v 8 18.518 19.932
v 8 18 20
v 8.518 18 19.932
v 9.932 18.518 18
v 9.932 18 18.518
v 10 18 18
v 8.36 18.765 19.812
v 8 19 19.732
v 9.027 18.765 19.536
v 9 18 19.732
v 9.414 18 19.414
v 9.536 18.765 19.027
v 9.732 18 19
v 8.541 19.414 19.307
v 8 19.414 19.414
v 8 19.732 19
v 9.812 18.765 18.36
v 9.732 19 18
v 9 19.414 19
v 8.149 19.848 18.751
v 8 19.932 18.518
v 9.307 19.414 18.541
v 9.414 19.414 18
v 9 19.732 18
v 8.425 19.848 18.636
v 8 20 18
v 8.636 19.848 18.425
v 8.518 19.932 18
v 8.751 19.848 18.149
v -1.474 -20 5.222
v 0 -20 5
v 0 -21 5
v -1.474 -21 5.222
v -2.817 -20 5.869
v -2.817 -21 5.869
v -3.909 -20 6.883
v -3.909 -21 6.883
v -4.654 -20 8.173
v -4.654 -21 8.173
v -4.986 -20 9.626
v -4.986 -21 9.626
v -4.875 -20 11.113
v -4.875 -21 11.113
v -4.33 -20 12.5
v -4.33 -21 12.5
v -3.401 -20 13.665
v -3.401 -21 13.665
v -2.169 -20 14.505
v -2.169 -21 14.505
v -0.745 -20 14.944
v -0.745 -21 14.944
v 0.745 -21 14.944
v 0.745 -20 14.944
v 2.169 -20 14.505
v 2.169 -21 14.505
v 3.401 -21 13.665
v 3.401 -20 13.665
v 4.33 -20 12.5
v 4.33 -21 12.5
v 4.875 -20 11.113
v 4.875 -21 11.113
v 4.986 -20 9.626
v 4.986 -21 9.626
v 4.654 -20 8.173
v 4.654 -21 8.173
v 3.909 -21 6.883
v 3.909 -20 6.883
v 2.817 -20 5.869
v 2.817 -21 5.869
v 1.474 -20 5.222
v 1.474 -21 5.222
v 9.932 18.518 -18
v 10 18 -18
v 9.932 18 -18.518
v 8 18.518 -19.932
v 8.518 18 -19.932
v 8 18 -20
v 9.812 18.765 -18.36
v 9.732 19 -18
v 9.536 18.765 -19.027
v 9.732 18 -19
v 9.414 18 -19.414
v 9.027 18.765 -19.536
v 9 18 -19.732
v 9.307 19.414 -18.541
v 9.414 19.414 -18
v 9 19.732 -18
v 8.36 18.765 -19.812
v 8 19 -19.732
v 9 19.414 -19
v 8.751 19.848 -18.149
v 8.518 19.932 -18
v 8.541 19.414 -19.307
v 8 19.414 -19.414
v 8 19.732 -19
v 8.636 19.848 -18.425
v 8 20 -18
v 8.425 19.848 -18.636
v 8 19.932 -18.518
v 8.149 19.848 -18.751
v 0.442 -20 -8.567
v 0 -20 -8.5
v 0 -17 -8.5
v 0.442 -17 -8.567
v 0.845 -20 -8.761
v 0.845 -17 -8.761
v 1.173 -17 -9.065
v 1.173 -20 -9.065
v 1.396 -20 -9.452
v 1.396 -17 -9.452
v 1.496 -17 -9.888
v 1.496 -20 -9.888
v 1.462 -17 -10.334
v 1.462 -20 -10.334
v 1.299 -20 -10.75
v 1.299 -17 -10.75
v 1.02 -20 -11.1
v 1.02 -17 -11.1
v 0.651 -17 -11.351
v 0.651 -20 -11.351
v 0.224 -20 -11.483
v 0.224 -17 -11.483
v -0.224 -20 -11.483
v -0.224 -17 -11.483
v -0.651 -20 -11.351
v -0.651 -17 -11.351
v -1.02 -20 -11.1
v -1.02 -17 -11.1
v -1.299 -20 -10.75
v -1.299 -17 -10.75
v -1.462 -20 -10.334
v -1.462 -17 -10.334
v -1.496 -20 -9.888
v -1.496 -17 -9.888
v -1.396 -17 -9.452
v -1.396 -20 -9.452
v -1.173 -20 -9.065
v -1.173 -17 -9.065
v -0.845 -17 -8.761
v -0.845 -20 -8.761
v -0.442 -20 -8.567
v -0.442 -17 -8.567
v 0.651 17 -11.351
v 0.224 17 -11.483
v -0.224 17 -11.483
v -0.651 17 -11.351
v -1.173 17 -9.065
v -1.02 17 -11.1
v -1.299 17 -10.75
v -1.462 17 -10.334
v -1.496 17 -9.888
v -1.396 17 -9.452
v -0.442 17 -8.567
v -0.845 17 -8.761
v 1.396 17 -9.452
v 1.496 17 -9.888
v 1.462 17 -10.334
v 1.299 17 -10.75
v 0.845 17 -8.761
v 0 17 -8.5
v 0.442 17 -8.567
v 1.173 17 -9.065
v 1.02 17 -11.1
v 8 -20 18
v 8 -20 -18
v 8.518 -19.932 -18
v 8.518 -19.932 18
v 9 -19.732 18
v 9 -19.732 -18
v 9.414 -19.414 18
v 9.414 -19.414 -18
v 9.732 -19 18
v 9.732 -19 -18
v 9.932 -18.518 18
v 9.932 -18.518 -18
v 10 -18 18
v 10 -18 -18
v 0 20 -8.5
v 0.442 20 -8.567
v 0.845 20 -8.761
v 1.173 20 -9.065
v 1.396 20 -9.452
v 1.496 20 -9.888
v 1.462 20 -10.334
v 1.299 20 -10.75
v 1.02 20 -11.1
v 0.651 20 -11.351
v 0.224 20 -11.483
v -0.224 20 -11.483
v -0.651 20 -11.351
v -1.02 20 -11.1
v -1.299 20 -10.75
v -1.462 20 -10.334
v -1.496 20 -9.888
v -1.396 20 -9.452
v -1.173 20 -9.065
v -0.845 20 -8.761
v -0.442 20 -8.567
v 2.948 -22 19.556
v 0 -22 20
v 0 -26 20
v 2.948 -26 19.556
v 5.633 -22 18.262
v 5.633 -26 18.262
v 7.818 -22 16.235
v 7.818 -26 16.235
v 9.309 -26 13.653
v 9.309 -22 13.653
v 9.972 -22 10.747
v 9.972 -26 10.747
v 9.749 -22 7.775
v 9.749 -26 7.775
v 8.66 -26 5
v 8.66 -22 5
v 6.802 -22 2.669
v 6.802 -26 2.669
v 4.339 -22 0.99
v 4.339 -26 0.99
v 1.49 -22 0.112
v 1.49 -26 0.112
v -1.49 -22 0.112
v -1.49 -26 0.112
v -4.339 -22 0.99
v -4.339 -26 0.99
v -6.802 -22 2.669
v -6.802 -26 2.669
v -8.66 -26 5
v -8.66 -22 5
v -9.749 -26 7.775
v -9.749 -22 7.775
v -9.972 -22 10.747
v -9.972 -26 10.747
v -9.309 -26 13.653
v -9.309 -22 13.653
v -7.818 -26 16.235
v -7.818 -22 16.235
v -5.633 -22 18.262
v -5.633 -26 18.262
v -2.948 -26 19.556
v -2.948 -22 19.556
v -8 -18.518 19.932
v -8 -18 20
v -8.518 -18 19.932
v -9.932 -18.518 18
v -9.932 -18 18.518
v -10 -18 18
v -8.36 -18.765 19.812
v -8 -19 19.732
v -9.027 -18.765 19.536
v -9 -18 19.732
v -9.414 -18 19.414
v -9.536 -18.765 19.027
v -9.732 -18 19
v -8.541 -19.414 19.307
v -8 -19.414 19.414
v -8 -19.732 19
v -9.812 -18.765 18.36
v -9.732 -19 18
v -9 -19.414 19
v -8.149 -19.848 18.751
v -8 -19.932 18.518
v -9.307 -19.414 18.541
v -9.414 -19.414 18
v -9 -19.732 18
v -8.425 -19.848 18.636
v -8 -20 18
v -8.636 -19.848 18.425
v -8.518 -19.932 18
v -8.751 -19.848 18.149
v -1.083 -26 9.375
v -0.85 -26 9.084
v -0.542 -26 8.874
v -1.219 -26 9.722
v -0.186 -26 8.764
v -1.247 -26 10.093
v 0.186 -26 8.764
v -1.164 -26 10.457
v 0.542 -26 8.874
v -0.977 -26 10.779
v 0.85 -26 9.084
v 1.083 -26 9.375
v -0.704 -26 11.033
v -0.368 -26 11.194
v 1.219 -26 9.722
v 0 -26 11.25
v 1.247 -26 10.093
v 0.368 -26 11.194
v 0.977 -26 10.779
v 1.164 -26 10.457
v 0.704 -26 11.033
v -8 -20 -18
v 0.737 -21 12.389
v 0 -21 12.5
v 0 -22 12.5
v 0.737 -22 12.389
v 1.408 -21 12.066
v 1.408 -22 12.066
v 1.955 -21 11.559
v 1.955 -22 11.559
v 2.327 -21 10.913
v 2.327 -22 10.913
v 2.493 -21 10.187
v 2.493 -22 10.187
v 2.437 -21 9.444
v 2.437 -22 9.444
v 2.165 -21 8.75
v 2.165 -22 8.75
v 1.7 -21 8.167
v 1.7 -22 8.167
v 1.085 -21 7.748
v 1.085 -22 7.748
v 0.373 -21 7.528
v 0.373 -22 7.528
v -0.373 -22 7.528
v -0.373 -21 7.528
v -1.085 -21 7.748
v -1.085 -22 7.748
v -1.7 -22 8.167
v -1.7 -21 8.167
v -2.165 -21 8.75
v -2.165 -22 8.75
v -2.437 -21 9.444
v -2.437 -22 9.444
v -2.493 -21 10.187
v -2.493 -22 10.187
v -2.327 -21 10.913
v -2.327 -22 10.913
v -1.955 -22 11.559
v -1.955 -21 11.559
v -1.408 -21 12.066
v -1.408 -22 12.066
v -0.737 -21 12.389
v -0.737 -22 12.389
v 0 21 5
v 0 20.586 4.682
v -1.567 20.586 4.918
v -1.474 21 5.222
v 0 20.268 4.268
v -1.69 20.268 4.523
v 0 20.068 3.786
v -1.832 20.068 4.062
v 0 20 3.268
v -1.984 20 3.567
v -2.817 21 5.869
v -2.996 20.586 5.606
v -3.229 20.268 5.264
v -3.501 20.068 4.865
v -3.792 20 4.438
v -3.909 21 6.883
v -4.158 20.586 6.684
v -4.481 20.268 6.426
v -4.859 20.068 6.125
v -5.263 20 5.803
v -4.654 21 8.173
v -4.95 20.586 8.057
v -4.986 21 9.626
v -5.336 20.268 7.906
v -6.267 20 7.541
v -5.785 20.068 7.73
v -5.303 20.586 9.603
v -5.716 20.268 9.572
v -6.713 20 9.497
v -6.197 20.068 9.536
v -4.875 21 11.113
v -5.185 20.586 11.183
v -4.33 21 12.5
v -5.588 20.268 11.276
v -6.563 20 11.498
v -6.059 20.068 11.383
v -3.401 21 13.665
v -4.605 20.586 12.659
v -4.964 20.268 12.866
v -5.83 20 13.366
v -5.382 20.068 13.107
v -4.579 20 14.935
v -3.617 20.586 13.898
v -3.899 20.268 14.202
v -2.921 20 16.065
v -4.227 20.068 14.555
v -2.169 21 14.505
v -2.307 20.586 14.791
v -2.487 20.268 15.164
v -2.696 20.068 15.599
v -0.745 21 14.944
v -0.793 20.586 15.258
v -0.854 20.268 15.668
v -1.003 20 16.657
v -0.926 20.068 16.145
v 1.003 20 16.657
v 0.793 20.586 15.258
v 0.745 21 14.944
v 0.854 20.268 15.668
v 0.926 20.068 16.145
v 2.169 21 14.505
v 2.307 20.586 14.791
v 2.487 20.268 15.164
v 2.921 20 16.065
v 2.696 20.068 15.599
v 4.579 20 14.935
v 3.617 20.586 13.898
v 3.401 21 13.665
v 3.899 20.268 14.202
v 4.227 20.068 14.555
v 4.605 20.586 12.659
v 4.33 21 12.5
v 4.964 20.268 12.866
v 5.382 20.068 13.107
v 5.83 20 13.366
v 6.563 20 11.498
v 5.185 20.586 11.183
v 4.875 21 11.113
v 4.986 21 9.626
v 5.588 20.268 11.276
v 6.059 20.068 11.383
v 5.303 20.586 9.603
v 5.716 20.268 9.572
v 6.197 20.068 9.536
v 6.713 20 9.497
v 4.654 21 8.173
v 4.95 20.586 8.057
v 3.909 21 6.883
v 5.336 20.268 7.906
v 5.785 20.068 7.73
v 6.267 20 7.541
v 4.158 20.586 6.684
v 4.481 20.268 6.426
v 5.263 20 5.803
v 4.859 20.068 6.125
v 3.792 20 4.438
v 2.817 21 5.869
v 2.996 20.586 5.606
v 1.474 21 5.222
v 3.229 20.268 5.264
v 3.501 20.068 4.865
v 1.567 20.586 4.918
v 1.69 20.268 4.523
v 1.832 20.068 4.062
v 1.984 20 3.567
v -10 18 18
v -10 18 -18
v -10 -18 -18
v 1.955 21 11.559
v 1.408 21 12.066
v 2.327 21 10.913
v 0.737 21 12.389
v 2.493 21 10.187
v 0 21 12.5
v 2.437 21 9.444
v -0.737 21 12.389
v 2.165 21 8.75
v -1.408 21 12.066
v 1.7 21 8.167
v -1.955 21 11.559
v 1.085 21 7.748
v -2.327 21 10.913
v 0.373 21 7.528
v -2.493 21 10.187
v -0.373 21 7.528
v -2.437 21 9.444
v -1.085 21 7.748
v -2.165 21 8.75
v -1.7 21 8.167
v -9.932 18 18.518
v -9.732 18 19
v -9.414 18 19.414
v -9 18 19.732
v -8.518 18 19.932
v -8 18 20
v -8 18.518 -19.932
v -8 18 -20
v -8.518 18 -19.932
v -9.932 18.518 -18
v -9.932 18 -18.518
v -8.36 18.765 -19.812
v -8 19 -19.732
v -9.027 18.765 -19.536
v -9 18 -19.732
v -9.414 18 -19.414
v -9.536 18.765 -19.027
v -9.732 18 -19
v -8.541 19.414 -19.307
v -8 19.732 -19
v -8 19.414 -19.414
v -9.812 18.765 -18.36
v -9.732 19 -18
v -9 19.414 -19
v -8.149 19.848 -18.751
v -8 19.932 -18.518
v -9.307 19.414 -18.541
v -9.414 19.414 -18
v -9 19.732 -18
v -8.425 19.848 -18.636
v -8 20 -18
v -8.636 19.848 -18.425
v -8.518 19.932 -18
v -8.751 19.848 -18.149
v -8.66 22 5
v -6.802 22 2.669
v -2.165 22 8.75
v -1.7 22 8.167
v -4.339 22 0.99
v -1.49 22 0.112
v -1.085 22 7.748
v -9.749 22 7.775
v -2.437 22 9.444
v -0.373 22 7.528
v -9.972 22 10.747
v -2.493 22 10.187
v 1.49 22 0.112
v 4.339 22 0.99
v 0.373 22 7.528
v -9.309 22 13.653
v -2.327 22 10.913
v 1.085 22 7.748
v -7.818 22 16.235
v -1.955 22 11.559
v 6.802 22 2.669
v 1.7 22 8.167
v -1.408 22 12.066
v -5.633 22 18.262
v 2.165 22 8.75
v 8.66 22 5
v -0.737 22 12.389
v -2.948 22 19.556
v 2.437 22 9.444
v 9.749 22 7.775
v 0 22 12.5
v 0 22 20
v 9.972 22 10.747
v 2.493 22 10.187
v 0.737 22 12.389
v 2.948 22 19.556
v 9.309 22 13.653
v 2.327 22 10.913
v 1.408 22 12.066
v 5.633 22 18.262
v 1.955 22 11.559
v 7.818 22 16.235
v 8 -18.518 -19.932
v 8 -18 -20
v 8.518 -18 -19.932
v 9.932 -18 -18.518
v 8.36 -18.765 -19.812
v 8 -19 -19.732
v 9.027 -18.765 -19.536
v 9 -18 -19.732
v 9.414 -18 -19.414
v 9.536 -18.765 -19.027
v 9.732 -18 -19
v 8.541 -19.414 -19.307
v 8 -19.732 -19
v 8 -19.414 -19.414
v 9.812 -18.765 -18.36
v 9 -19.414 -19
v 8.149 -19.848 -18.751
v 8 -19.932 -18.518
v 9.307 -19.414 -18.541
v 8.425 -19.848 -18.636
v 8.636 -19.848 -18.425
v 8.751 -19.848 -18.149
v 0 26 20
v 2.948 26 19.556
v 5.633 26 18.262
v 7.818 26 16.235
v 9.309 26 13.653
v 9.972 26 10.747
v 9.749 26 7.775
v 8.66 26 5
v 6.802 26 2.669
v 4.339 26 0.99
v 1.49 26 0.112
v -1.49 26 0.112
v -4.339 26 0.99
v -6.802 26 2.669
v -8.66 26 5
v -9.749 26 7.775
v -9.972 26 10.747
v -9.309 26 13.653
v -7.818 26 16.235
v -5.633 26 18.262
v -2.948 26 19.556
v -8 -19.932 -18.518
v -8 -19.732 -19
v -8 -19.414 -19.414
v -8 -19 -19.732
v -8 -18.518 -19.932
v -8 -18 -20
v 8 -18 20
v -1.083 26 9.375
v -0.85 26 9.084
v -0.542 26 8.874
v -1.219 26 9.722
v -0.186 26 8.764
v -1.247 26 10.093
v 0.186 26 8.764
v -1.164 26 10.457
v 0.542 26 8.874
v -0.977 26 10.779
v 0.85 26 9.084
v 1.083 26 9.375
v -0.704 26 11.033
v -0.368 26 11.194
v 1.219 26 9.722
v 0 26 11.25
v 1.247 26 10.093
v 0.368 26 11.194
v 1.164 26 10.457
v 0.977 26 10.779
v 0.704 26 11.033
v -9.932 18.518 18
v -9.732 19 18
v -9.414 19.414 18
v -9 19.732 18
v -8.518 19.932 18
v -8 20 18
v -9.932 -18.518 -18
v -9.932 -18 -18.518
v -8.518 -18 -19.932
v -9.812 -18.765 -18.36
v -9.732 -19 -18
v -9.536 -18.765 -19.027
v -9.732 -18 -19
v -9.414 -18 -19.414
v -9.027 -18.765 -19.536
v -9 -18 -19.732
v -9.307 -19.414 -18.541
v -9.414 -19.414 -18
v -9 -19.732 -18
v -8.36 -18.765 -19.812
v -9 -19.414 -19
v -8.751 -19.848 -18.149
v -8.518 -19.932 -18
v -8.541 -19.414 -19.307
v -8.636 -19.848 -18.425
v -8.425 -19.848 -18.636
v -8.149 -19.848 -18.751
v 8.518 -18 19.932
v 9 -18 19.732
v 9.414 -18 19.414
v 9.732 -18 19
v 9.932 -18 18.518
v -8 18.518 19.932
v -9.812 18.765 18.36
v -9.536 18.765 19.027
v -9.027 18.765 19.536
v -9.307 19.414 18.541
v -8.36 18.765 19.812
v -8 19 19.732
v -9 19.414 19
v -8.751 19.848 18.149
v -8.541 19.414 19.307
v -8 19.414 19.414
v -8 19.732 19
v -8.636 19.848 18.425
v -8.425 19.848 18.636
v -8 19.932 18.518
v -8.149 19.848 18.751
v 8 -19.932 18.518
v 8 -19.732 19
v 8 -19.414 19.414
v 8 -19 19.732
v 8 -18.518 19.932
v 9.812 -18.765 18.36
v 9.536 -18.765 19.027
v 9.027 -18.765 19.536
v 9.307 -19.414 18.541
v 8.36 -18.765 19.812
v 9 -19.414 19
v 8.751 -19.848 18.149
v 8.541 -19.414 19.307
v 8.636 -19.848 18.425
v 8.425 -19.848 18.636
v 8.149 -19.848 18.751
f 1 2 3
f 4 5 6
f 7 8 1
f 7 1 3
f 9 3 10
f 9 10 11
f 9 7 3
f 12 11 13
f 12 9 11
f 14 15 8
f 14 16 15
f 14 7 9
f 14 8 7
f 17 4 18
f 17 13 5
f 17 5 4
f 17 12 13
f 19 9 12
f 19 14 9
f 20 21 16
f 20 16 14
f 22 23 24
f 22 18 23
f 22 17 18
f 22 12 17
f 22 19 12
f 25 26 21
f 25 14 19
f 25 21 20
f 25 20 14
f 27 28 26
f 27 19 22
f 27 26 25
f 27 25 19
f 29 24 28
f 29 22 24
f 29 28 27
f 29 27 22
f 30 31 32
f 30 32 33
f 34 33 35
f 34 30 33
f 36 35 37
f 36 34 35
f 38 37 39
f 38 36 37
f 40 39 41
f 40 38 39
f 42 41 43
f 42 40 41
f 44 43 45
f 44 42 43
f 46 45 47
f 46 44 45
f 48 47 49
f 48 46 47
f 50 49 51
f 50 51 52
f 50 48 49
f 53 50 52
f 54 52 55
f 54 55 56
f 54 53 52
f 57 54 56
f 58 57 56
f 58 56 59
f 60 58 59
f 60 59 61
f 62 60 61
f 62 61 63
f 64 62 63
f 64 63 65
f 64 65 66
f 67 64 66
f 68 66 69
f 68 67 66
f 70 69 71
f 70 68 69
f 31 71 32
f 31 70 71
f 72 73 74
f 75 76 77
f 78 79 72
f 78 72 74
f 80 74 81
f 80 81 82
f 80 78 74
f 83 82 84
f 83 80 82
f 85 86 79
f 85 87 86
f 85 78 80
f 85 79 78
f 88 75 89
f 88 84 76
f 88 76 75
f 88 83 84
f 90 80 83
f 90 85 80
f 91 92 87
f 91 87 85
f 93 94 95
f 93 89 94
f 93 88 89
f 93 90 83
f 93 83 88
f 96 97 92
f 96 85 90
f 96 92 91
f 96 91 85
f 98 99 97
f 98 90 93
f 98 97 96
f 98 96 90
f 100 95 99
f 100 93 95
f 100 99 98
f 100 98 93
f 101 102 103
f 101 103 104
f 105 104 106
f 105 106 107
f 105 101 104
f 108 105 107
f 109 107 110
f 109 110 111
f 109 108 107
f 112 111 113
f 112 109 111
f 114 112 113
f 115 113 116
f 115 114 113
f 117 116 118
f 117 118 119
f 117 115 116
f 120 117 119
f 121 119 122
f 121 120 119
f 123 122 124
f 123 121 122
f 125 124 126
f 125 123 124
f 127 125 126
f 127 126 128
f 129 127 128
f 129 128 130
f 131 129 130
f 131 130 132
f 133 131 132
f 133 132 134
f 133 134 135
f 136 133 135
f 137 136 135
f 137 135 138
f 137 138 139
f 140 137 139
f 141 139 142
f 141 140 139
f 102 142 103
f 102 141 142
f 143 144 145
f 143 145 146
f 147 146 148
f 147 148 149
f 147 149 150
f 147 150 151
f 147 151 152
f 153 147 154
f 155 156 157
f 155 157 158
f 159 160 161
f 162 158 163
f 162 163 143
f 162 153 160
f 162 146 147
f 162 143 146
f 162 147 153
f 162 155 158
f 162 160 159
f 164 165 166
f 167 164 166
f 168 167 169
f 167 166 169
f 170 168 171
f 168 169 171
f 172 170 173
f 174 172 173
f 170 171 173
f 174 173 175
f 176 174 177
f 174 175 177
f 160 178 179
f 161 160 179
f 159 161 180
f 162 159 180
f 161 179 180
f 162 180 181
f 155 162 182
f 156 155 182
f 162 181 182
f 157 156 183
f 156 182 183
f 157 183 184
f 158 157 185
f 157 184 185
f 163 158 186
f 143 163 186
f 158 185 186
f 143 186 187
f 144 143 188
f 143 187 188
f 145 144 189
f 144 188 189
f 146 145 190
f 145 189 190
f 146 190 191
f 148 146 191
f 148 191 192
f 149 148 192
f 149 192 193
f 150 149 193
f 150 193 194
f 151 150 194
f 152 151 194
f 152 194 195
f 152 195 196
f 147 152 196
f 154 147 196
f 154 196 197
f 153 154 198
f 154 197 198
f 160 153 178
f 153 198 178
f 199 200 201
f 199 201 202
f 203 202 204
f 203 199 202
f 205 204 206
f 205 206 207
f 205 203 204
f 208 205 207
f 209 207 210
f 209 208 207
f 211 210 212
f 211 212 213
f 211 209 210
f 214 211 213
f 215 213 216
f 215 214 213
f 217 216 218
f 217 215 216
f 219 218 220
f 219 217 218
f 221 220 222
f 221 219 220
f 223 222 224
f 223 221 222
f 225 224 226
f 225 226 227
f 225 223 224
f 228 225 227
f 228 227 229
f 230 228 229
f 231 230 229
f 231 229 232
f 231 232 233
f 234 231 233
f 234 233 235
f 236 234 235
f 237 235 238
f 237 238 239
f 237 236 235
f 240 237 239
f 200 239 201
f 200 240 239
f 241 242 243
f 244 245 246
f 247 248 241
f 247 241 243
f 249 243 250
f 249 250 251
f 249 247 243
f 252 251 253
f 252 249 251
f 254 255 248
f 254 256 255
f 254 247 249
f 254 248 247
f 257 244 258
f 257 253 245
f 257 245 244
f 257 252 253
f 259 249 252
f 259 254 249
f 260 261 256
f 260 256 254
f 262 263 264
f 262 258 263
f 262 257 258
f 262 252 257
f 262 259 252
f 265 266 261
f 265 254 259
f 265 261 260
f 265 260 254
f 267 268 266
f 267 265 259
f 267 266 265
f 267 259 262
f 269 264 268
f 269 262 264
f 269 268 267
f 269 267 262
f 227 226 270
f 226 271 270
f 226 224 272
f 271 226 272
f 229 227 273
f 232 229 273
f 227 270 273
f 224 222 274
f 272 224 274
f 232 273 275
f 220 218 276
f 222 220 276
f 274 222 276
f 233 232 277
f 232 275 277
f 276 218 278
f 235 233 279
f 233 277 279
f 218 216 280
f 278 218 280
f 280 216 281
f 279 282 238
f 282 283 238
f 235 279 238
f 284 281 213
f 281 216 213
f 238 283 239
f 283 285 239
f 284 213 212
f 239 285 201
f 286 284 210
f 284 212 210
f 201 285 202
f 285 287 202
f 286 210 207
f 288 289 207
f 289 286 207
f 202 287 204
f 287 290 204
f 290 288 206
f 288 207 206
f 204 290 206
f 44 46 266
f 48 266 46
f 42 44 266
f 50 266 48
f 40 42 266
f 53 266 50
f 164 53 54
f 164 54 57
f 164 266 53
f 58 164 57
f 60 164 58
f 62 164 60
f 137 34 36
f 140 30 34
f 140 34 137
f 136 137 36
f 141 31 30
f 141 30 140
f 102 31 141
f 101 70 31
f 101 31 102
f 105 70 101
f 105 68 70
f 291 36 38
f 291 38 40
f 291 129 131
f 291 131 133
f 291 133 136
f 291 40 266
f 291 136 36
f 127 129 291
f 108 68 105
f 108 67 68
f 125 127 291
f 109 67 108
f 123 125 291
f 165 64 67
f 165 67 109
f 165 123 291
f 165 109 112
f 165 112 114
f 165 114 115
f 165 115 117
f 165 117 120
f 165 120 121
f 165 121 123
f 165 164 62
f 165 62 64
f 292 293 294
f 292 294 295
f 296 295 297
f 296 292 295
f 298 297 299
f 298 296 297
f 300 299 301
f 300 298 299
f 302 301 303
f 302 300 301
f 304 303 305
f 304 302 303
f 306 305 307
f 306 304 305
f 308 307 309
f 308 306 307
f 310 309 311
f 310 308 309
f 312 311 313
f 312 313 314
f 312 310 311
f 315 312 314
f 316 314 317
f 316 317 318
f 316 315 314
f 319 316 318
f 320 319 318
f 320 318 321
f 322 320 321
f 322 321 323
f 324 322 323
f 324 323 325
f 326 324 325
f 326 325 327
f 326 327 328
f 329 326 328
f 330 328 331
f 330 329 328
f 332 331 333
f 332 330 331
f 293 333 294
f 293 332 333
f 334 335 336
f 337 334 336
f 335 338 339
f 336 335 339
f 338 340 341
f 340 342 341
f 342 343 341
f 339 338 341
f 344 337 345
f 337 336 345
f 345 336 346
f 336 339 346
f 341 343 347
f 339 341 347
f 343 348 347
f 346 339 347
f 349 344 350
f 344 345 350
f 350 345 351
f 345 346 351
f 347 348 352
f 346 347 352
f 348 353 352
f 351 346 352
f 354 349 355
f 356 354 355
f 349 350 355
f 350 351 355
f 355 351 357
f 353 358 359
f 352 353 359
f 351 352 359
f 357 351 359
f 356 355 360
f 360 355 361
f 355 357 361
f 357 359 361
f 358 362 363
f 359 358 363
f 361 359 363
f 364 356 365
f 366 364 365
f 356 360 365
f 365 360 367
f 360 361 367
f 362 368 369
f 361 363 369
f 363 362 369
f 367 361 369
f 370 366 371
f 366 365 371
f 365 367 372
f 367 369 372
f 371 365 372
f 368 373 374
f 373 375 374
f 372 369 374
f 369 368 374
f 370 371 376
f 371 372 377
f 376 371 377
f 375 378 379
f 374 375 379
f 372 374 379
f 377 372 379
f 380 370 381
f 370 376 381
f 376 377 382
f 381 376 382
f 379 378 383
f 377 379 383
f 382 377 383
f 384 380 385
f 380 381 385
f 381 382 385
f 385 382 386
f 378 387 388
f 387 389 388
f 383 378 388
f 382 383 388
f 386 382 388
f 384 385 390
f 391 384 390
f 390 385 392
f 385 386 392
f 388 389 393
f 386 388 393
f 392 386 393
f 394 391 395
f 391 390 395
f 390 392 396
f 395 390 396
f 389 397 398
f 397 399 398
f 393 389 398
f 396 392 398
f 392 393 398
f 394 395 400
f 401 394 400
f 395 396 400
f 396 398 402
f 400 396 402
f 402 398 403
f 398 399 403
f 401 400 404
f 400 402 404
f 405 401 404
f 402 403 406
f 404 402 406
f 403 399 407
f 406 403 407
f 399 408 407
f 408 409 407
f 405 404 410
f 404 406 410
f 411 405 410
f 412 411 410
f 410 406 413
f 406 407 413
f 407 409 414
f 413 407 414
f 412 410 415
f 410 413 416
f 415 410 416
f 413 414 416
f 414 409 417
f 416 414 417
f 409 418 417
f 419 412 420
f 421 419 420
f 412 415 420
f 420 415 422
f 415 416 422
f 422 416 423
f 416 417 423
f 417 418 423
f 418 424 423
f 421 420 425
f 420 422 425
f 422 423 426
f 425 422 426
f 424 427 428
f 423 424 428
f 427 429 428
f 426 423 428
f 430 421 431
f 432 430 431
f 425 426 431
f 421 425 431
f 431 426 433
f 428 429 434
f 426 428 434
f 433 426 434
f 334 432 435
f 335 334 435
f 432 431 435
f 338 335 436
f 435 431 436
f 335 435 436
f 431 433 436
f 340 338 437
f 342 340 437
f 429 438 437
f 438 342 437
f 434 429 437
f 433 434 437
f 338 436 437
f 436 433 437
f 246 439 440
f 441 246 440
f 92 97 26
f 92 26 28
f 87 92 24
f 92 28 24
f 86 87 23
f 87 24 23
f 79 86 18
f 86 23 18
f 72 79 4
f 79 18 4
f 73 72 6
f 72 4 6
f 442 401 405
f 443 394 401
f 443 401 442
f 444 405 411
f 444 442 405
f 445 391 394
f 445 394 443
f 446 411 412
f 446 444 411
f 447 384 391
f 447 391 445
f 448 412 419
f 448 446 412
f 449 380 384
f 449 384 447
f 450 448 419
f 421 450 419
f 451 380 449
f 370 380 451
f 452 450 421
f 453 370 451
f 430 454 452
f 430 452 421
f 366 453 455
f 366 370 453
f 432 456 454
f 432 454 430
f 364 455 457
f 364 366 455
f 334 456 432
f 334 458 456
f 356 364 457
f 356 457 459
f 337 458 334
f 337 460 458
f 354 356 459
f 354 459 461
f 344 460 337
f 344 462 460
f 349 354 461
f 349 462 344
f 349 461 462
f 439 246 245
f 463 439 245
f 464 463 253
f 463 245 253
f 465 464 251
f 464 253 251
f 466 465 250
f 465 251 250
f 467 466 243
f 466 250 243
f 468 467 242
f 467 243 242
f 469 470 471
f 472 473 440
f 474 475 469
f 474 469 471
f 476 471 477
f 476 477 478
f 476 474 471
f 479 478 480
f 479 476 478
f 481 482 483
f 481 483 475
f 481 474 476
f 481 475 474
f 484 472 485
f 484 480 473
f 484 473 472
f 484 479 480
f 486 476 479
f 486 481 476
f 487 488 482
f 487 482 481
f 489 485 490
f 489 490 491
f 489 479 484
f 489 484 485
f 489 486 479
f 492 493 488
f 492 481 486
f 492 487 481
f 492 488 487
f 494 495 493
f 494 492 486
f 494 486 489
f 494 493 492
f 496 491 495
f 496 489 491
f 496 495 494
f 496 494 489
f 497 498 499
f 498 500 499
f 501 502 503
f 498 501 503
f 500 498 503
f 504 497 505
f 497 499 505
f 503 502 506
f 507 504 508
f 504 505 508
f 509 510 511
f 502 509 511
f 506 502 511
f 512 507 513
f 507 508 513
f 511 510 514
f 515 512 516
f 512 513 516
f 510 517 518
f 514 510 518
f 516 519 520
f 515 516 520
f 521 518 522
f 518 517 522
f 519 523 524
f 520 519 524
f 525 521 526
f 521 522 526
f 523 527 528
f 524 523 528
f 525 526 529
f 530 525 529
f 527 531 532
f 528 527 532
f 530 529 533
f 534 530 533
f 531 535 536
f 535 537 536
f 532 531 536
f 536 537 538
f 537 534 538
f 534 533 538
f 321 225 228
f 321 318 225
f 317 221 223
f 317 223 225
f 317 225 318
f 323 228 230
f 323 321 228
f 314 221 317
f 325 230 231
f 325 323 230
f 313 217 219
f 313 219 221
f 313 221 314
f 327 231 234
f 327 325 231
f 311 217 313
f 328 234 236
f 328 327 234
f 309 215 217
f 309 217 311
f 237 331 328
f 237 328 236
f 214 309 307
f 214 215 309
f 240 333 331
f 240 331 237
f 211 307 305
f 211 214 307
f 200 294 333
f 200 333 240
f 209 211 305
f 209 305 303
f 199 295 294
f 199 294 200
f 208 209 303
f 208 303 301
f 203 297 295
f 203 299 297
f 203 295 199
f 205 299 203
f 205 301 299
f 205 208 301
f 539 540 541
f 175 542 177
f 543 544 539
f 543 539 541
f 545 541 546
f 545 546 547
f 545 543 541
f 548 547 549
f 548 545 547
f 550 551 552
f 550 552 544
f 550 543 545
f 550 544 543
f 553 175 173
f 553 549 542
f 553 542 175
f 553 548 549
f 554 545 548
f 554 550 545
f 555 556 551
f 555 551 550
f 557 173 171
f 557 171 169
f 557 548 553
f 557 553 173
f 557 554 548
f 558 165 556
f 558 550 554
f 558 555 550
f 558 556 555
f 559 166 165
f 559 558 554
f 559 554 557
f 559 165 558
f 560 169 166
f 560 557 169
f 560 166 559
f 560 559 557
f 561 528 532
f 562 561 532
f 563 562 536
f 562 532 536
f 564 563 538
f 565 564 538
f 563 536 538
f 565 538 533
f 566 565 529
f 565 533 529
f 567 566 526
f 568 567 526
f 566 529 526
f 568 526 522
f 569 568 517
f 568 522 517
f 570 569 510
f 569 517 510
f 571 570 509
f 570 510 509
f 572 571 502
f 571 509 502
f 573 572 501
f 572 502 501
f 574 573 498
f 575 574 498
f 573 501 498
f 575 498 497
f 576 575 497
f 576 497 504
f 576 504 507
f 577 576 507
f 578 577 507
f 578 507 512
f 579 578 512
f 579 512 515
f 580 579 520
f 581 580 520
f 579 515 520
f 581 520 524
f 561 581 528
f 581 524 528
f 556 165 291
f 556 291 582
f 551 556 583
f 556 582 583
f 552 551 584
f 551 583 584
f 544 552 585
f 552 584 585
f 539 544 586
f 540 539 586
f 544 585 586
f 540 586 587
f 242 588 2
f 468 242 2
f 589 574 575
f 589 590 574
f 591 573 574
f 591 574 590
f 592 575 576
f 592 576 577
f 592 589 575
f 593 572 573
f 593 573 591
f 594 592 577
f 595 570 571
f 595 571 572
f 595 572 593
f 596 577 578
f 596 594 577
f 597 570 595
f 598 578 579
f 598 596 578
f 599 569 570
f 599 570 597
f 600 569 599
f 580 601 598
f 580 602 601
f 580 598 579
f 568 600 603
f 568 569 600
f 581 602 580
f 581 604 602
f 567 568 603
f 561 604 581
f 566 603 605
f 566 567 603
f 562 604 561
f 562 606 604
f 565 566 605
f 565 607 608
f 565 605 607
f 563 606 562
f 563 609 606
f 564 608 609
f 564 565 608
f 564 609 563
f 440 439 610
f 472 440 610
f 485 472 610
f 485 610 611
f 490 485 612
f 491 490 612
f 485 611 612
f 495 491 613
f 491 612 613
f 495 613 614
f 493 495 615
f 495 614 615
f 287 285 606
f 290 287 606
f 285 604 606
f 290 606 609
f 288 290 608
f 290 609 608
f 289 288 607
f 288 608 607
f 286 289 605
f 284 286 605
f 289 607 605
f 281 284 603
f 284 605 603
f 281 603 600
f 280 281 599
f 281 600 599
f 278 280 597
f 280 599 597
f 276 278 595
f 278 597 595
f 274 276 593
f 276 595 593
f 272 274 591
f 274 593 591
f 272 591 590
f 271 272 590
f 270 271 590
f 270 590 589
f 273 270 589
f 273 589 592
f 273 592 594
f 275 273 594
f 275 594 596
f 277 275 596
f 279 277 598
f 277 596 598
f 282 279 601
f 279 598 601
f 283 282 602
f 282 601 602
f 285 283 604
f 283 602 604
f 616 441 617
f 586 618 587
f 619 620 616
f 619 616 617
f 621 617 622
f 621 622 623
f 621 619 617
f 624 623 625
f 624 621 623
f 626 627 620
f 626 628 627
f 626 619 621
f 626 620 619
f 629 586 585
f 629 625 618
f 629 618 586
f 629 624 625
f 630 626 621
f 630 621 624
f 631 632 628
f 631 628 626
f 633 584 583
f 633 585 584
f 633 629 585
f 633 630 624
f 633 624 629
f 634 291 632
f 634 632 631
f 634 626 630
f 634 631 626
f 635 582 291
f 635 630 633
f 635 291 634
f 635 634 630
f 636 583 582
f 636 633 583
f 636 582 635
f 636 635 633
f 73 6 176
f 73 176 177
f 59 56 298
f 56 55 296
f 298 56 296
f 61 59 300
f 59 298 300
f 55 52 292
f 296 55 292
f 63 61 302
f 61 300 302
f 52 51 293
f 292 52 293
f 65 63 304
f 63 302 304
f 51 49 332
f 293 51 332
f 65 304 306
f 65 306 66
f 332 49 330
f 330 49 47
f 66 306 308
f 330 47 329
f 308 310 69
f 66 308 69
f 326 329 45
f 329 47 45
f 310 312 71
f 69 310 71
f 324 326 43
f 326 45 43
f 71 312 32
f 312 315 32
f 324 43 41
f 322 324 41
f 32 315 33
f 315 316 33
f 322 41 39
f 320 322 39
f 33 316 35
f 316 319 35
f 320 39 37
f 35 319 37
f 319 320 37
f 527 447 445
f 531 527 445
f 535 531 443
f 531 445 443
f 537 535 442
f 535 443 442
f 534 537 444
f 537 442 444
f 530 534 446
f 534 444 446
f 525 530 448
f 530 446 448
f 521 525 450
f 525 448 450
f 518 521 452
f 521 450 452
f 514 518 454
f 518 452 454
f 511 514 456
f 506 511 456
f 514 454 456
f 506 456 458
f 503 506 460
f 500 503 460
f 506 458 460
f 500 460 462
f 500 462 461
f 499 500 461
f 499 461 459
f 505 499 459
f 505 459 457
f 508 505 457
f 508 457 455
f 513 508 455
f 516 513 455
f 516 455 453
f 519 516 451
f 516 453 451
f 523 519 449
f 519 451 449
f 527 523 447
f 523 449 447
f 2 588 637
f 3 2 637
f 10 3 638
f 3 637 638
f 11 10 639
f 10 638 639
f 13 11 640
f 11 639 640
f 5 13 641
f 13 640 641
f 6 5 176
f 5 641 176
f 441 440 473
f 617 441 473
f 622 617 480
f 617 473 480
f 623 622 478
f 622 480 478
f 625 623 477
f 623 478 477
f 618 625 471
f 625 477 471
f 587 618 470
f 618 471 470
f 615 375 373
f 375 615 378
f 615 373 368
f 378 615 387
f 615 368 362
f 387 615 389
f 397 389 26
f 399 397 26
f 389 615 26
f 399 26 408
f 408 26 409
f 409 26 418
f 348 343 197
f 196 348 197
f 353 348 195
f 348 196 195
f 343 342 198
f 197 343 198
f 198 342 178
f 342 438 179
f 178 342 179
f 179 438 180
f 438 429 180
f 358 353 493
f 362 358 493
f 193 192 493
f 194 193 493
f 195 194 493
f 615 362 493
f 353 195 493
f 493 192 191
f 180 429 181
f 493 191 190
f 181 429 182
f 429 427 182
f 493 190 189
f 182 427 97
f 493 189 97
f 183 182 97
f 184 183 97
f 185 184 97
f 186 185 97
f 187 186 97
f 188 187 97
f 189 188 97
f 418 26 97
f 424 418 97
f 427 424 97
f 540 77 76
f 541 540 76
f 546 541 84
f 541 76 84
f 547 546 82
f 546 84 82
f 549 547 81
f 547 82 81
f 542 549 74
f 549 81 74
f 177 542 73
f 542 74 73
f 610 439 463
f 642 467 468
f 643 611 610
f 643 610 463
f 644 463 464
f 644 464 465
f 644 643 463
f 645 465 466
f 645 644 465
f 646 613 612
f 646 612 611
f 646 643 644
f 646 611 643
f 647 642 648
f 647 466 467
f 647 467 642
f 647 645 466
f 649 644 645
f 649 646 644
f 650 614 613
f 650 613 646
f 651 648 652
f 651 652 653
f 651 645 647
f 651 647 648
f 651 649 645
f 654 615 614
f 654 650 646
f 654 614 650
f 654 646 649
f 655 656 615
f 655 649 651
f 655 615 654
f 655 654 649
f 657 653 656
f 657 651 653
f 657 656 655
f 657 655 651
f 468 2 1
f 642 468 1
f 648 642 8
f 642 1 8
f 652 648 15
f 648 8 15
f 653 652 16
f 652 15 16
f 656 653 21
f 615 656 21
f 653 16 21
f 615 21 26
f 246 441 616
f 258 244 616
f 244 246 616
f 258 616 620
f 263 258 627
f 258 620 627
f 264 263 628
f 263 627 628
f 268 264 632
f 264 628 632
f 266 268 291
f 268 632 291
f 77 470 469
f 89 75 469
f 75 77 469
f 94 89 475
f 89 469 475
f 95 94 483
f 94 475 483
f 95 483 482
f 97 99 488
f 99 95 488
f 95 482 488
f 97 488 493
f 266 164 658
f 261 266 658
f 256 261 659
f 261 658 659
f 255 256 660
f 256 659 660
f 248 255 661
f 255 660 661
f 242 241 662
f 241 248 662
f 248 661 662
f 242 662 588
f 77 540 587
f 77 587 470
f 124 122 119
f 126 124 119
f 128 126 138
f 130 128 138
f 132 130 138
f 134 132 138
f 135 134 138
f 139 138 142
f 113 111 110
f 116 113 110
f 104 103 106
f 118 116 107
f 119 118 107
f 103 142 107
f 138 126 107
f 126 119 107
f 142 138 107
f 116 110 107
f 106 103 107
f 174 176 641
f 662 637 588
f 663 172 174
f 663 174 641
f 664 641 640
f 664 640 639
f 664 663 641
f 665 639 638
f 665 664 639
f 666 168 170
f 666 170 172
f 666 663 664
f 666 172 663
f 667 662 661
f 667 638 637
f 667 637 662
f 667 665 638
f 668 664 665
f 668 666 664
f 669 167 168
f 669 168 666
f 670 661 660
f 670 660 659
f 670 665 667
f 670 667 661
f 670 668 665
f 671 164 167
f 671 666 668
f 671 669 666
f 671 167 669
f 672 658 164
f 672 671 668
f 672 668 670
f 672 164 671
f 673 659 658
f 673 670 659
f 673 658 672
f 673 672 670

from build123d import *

# Parameters (mm, degrees)
SKETCH_1_W          = 40
SKETCH_1_H          = 40
EXTRUDE_1_DEPTH     = 10
SKETCH_2_R          = 5
EXTRUDE_2_DEPTH     = 1
SKETCH_3_R          = 2.5
EXTRUDE_3_DEPTH     = 1
SKETCH_4_R          = 10
EXTRUDE_4_DEPTH     = 4
CUT_EXTRUDE_START   = -46
SKETCH_5_R          = 1.25
CUT_EXTRUDE_1_DEPTH = 46
FILLET_1_R          = 2
SKETCH_6_R          = 1.5
CUT_EXTRUDE_2_DEPTH = 3


with BuildPart() as part:
    # 草图1 → 凸台-拉伸1 (new, symmetric)
    with BuildSketch(Plane(origin=(0, 0, 0), x_dir=(0, 0, -1), z_dir=(1, 0, 0))):
        Rectangle(SKETCH_1_W, SKETCH_1_H)
    extrude(amount=EXTRUDE_1_DEPTH, both=True)

    # 草图2 → 凸台-拉伸2 (add)
    with BuildSketch(Plane(origin=(0, 20, 0), x_dir=(1, 0, 0), z_dir=(0, 1, 0))):
        with Locations(Location((0, -10, 0), (0, 0, 90))):
            Circle(SKETCH_2_R)
    extrude_2 = extrude(amount=EXTRUDE_2_DEPTH)

    # 草图3 → 凸台-拉伸3 (add)
    with BuildSketch(Plane(origin=(0, 21, 0), x_dir=(1, 0, 0), z_dir=(0, 1, 0))):
        with Locations(Location((0, -10, 0), (0, 0, 270))):
            Circle(SKETCH_3_R)
    extrude_3 = extrude(amount=EXTRUDE_3_DEPTH)

    # 草图4 → 凸台-拉伸4 (add)
    with BuildSketch(Plane(origin=(0, 22, 0), x_dir=(1, 0, 0), z_dir=(0, 1, 0))):
        with Locations(Location((0, -10, 0), (0, 0, 270))):
            Circle(SKETCH_4_R)
    extrude_4 = extrude(amount=EXTRUDE_4_DEPTH)

    # 草图5 → 切除-拉伸1 (cut)
    with BuildSketch(Plane(origin=(0, 26, 0), x_dir=(1, 0, 0), z_dir=(0, 1, 0)).offset(CUT_EXTRUDE_START)):
        with Locations(Location((0, -10, 0), (0, 0, 270))):
            Circle(SKETCH_5_R)
    cut_extrude_1 = extrude(amount=CUT_EXTRUDE_1_DEPTH, mode=Mode.SUBTRACT)

    # 镜向1: 凸台-拉伸2, 凸台-拉伸3, 凸台-拉伸4, 切除-拉伸1 across plane
    add(extrude_2.mirror(Plane.ZX))
    add(extrude_3.mirror(Plane.ZX))
    add(extrude_4.mirror(Plane.ZX))
    add(cut_extrude_1.mirror(Plane.ZX), mode=Mode.SUBTRACT)

    # 圆角1
    # the kernel refuses this fillet: 2 mm, written as the material it adds along each edge
    with BuildSketch(Plane(origin=(0, 20, 10), x_dir=(0, 0, -1), z_dir=(1, 0, 0))) as fillet_1_piece_1:
        with BuildLine():
            CenterArc((6.732050808, 2), FILLET_1_R, 210, 60)
            Line((6.732050808, 0), (5, 0))
            Line((5, 0), (5, 1))
        make_face()
    revolve(axis=Axis((0, 20, 10), (0, 1, 0)))
    # the kernel refuses this fillet: 2 mm, written as the material it takes off along each edge
    with BuildSketch(Plane(origin=(8, 18, -18), x_dir=(0, 0, -1), z_dir=(0, 1, 0))) as fillet_1_2_piece_1_section:
        Polygon((0, 0), (FILLET_1_R * 1.02, 0), (FILLET_1_R * 1.02, -FILLET_1_R * 1.02), (0, -FILLET_1_R * 1.02), align=None)
    fillet_1_2_piece_1 = extrude(amount=FILLET_1_R * 1.02, mode=Mode.PRIVATE)
    fillet_1_2_piece_1 = fillet_1_2_piece_1 - Plane(origin=(8, 18, -18), x_dir=(-0.7071067811865475, 0, 0.7071067811865475), z_dir=(0, 1, 0)) * Sphere(FILLET_1_R, mode=Mode.PRIVATE)
    add(fillet_1_2_piece_1, mode=Mode.SUBTRACT)
    with BuildSketch(Plane(origin=(8, -18, -18), x_dir=(0, 0, -1), z_dir=(0, -1, 0))) as fillet_1_2_piece_2_section:
        Polygon((0, 0), (FILLET_1_R * 1.02, 0), (FILLET_1_R * 1.02, FILLET_1_R * 1.02), (0, FILLET_1_R * 1.02), align=None)
    fillet_1_2_piece_2 = extrude(amount=FILLET_1_R * 1.02, mode=Mode.PRIVATE)
    fillet_1_2_piece_2 = fillet_1_2_piece_2 - Plane(origin=(8, -18, -18), x_dir=(-0.7071067811865475, 0, 0.7071067811865475), z_dir=(0, -1, 0)) * Sphere(FILLET_1_R, mode=Mode.PRIVATE)
    add(fillet_1_2_piece_2, mode=Mode.SUBTRACT)
    with BuildSketch(Plane(origin=(8, 18, 18), x_dir=(1, 0, 0), z_dir=(0, 1, 0))) as fillet_1_2_piece_3_section:
        Polygon((0, 0), (FILLET_1_R * 1.02, 0), (FILLET_1_R * 1.02, -FILLET_1_R * 1.02), (0, -FILLET_1_R * 1.02), align=None)
    fillet_1_2_piece_3 = extrude(amount=FILLET_1_R * 1.02, mode=Mode.PRIVATE)
    fillet_1_2_piece_3 = fillet_1_2_piece_3 - Plane(origin=(8, 18, 18), x_dir=(-0.7071067811865475, 0, -0.7071067811865475), z_dir=(0, 1, 0)) * Sphere(FILLET_1_R, mode=Mode.PRIVATE)
    add(fillet_1_2_piece_3, mode=Mode.SUBTRACT)
    with BuildSketch(Plane(origin=(8, -18, 18), x_dir=(1, 0, 0), z_dir=(0, -1, 0))) as fillet_1_2_piece_4_section:
        Polygon((0, 0), (FILLET_1_R * 1.02, 0), (FILLET_1_R * 1.02, FILLET_1_R * 1.02), (0, FILLET_1_R * 1.02), align=None)
    fillet_1_2_piece_4 = extrude(amount=FILLET_1_R * 1.02, mode=Mode.PRIVATE)
    fillet_1_2_piece_4 = fillet_1_2_piece_4 - Plane(origin=(8, -18, 18), x_dir=(-0.7071067811865475, 0, -0.7071067811865475), z_dir=(0, -1, 0)) * Sphere(FILLET_1_R, mode=Mode.PRIVATE)
    add(fillet_1_2_piece_4, mode=Mode.SUBTRACT)
    with BuildSketch(Plane(origin=(-8, 18, 18), x_dir=(-1, 0, 0), z_dir=(0, 1, 0))) as fillet_1_2_piece_5_section:
        Polygon((0, 0), (FILLET_1_R * 1.02, 0), (FILLET_1_R * 1.02, FILLET_1_R * 1.02), (0, FILLET_1_R * 1.02), align=None)
    fillet_1_2_piece_5 = extrude(amount=FILLET_1_R * 1.02, mode=Mode.PRIVATE)
    fillet_1_2_piece_5 = fillet_1_2_piece_5 - Plane(origin=(-8, 18, 18), x_dir=(0.7071067811865475, 0, -0.7071067811865475), z_dir=(0, 1, 0)) * Sphere(FILLET_1_R, mode=Mode.PRIVATE)
    add(fillet_1_2_piece_5, mode=Mode.SUBTRACT)
    with BuildSketch(Plane(origin=(-8, 18, -18), x_dir=(0, 0, -1), z_dir=(0, 1, 0))) as fillet_1_2_piece_6_section:
        Polygon((0, 0), (FILLET_1_R * 1.02, 0), (FILLET_1_R * 1.02, FILLET_1_R * 1.02), (0, FILLET_1_R * 1.02), align=None)
    fillet_1_2_piece_6 = extrude(amount=FILLET_1_R * 1.02, mode=Mode.PRIVATE)
    fillet_1_2_piece_6 = fillet_1_2_piece_6 - Plane(origin=(-8, 18, -18), x_dir=(0.7071067811865475, 0, 0.7071067811865475), z_dir=(0, 1, 0)) * Sphere(FILLET_1_R, mode=Mode.PRIVATE)
    add(fillet_1_2_piece_6, mode=Mode.SUBTRACT)
    with BuildSketch(Plane(origin=(-8, -18, -18), x_dir=(0, 0, -1), z_dir=(0, -1, 0))) as fillet_1_2_piece_7_section:
        Polygon((0, 0), (FILLET_1_R * 1.02, 0), (FILLET_1_R * 1.02, -FILLET_1_R * 1.02), (0, -FILLET_1_R * 1.02), align=None)
    fillet_1_2_piece_7 = extrude(amount=FILLET_1_R * 1.02, mode=Mode.PRIVATE)
    fillet_1_2_piece_7 = fillet_1_2_piece_7 - Plane(origin=(-8, -18, -18), x_dir=(0.7071067811865475, 0, 0.7071067811865475), z_dir=(0, -1, 0)) * Sphere(FILLET_1_R, mode=Mode.PRIVATE)
    add(fillet_1_2_piece_7, mode=Mode.SUBTRACT)
    with BuildSketch(Plane(origin=(-8, -18, 18), x_dir=(-1, 0, 0), z_dir=(0, -1, 0))) as fillet_1_2_piece_8_section:
        Polygon((0, 0), (FILLET_1_R * 1.02, 0), (FILLET_1_R * 1.02, -FILLET_1_R * 1.02), (0, -FILLET_1_R * 1.02), align=None)
    fillet_1_2_piece_8 = extrude(amount=FILLET_1_R * 1.02, mode=Mode.PRIVATE)
    fillet_1_2_piece_8 = fillet_1_2_piece_8 - Plane(origin=(-8, -18, 18), x_dir=(0.7071067811865475, 0, -0.7071067811865475), z_dir=(0, -1, 0)) * Sphere(FILLET_1_R, mode=Mode.PRIVATE)
    add(fillet_1_2_piece_8, mode=Mode.SUBTRACT)
    with BuildSketch(Plane(origin=(10, 18, -20), x_dir=(-1, 0, 0), z_dir=(0, -1, 0)), Plane(origin=(-10, 20, 18), x_dir=(0, -1, 0), z_dir=(0, 0, -1)), Plane(origin=(-10, -18, 20), x_dir=(0, 0, -1), z_dir=(0, 1, 0)), Plane(origin=(10, -20, -18), x_dir=(-1, 0, 0), z_dir=(0, 0, 1))) as fillet_1_2_piece_9:
        with BuildLine():
            CenterArc((FILLET_1_R, -FILLET_1_R), FILLET_1_R, 90, 90)
            Line((0, -FILLET_1_R), (0, 0))
            Line((0, 0), (FILLET_1_R, 0))
        make_face()
    extrude(amount=36, mode=Mode.SUBTRACT)
    with BuildSketch(Plane(origin=(10, 20, 18), x_dir=(0, -1, 0), z_dir=(0, 0, -1)), Plane(origin=(10, -18, 20), x_dir=(0, 0, -1), z_dir=(0, 1, 0)), Plane(origin=(-10, 18, -20), x_dir=(1, 0, 0), z_dir=(0, -1, 0)), Plane(origin=(-10, -20, -18), x_dir=(1, 0, 0), z_dir=(0, 0, 1))) as fillet_1_2_piece_10:
        with BuildLine():
            CenterArc((FILLET_1_R, FILLET_1_R), FILLET_1_R, 180, 90)
            Line((0, FILLET_1_R), (0, 0))
            Line((0, 0), (FILLET_1_R, 0))
        make_face()
    extrude(amount=36, mode=Mode.SUBTRACT)
    with BuildSketch(Plane(origin=(8, 20, 20), x_dir=(0, -1, 0), z_dir=(-1, 0, 0)), Plane(origin=(-8, 20, -20), x_dir=(0, -1, 0), z_dir=(1, 0, 0)), Plane(origin=(-8, -20, -20), x_dir=(0, 0, 1), z_dir=(1, 0, 0)), Plane(origin=(8, -20, 20), x_dir=(0, 0, -1), z_dir=(-1, 0, 0))) as fillet_1_2_piece_11:
        with BuildLine():
            CenterArc((FILLET_1_R, -FILLET_1_R), FILLET_1_R, 90, 90)
            Line((0, -FILLET_1_R), (0, 0))
            Line((0, 0), (FILLET_1_R, 0))
        make_face()
    extrude(amount=16, mode=Mode.SUBTRACT)

    # 草图6 → 切除-拉伸2 (cut)
    with BuildSketch(Plane(origin=(0, 20, 0), x_dir=(1, 0, 0), z_dir=(0, 1, 0))):
        with Locations(Location((0, 10, 0), (0, 0, 270))):
            Circle(SKETCH_6_R)
    cut_extrude_2 = extrude(amount=-CUT_EXTRUDE_2_DEPTH, mode=Mode.SUBTRACT)

    # 镜向2: 切除-拉伸2 across plane
    add(cut_extrude_2.mirror(Plane.ZX), mode=Mode.SUBTRACT)


solid = part.part
